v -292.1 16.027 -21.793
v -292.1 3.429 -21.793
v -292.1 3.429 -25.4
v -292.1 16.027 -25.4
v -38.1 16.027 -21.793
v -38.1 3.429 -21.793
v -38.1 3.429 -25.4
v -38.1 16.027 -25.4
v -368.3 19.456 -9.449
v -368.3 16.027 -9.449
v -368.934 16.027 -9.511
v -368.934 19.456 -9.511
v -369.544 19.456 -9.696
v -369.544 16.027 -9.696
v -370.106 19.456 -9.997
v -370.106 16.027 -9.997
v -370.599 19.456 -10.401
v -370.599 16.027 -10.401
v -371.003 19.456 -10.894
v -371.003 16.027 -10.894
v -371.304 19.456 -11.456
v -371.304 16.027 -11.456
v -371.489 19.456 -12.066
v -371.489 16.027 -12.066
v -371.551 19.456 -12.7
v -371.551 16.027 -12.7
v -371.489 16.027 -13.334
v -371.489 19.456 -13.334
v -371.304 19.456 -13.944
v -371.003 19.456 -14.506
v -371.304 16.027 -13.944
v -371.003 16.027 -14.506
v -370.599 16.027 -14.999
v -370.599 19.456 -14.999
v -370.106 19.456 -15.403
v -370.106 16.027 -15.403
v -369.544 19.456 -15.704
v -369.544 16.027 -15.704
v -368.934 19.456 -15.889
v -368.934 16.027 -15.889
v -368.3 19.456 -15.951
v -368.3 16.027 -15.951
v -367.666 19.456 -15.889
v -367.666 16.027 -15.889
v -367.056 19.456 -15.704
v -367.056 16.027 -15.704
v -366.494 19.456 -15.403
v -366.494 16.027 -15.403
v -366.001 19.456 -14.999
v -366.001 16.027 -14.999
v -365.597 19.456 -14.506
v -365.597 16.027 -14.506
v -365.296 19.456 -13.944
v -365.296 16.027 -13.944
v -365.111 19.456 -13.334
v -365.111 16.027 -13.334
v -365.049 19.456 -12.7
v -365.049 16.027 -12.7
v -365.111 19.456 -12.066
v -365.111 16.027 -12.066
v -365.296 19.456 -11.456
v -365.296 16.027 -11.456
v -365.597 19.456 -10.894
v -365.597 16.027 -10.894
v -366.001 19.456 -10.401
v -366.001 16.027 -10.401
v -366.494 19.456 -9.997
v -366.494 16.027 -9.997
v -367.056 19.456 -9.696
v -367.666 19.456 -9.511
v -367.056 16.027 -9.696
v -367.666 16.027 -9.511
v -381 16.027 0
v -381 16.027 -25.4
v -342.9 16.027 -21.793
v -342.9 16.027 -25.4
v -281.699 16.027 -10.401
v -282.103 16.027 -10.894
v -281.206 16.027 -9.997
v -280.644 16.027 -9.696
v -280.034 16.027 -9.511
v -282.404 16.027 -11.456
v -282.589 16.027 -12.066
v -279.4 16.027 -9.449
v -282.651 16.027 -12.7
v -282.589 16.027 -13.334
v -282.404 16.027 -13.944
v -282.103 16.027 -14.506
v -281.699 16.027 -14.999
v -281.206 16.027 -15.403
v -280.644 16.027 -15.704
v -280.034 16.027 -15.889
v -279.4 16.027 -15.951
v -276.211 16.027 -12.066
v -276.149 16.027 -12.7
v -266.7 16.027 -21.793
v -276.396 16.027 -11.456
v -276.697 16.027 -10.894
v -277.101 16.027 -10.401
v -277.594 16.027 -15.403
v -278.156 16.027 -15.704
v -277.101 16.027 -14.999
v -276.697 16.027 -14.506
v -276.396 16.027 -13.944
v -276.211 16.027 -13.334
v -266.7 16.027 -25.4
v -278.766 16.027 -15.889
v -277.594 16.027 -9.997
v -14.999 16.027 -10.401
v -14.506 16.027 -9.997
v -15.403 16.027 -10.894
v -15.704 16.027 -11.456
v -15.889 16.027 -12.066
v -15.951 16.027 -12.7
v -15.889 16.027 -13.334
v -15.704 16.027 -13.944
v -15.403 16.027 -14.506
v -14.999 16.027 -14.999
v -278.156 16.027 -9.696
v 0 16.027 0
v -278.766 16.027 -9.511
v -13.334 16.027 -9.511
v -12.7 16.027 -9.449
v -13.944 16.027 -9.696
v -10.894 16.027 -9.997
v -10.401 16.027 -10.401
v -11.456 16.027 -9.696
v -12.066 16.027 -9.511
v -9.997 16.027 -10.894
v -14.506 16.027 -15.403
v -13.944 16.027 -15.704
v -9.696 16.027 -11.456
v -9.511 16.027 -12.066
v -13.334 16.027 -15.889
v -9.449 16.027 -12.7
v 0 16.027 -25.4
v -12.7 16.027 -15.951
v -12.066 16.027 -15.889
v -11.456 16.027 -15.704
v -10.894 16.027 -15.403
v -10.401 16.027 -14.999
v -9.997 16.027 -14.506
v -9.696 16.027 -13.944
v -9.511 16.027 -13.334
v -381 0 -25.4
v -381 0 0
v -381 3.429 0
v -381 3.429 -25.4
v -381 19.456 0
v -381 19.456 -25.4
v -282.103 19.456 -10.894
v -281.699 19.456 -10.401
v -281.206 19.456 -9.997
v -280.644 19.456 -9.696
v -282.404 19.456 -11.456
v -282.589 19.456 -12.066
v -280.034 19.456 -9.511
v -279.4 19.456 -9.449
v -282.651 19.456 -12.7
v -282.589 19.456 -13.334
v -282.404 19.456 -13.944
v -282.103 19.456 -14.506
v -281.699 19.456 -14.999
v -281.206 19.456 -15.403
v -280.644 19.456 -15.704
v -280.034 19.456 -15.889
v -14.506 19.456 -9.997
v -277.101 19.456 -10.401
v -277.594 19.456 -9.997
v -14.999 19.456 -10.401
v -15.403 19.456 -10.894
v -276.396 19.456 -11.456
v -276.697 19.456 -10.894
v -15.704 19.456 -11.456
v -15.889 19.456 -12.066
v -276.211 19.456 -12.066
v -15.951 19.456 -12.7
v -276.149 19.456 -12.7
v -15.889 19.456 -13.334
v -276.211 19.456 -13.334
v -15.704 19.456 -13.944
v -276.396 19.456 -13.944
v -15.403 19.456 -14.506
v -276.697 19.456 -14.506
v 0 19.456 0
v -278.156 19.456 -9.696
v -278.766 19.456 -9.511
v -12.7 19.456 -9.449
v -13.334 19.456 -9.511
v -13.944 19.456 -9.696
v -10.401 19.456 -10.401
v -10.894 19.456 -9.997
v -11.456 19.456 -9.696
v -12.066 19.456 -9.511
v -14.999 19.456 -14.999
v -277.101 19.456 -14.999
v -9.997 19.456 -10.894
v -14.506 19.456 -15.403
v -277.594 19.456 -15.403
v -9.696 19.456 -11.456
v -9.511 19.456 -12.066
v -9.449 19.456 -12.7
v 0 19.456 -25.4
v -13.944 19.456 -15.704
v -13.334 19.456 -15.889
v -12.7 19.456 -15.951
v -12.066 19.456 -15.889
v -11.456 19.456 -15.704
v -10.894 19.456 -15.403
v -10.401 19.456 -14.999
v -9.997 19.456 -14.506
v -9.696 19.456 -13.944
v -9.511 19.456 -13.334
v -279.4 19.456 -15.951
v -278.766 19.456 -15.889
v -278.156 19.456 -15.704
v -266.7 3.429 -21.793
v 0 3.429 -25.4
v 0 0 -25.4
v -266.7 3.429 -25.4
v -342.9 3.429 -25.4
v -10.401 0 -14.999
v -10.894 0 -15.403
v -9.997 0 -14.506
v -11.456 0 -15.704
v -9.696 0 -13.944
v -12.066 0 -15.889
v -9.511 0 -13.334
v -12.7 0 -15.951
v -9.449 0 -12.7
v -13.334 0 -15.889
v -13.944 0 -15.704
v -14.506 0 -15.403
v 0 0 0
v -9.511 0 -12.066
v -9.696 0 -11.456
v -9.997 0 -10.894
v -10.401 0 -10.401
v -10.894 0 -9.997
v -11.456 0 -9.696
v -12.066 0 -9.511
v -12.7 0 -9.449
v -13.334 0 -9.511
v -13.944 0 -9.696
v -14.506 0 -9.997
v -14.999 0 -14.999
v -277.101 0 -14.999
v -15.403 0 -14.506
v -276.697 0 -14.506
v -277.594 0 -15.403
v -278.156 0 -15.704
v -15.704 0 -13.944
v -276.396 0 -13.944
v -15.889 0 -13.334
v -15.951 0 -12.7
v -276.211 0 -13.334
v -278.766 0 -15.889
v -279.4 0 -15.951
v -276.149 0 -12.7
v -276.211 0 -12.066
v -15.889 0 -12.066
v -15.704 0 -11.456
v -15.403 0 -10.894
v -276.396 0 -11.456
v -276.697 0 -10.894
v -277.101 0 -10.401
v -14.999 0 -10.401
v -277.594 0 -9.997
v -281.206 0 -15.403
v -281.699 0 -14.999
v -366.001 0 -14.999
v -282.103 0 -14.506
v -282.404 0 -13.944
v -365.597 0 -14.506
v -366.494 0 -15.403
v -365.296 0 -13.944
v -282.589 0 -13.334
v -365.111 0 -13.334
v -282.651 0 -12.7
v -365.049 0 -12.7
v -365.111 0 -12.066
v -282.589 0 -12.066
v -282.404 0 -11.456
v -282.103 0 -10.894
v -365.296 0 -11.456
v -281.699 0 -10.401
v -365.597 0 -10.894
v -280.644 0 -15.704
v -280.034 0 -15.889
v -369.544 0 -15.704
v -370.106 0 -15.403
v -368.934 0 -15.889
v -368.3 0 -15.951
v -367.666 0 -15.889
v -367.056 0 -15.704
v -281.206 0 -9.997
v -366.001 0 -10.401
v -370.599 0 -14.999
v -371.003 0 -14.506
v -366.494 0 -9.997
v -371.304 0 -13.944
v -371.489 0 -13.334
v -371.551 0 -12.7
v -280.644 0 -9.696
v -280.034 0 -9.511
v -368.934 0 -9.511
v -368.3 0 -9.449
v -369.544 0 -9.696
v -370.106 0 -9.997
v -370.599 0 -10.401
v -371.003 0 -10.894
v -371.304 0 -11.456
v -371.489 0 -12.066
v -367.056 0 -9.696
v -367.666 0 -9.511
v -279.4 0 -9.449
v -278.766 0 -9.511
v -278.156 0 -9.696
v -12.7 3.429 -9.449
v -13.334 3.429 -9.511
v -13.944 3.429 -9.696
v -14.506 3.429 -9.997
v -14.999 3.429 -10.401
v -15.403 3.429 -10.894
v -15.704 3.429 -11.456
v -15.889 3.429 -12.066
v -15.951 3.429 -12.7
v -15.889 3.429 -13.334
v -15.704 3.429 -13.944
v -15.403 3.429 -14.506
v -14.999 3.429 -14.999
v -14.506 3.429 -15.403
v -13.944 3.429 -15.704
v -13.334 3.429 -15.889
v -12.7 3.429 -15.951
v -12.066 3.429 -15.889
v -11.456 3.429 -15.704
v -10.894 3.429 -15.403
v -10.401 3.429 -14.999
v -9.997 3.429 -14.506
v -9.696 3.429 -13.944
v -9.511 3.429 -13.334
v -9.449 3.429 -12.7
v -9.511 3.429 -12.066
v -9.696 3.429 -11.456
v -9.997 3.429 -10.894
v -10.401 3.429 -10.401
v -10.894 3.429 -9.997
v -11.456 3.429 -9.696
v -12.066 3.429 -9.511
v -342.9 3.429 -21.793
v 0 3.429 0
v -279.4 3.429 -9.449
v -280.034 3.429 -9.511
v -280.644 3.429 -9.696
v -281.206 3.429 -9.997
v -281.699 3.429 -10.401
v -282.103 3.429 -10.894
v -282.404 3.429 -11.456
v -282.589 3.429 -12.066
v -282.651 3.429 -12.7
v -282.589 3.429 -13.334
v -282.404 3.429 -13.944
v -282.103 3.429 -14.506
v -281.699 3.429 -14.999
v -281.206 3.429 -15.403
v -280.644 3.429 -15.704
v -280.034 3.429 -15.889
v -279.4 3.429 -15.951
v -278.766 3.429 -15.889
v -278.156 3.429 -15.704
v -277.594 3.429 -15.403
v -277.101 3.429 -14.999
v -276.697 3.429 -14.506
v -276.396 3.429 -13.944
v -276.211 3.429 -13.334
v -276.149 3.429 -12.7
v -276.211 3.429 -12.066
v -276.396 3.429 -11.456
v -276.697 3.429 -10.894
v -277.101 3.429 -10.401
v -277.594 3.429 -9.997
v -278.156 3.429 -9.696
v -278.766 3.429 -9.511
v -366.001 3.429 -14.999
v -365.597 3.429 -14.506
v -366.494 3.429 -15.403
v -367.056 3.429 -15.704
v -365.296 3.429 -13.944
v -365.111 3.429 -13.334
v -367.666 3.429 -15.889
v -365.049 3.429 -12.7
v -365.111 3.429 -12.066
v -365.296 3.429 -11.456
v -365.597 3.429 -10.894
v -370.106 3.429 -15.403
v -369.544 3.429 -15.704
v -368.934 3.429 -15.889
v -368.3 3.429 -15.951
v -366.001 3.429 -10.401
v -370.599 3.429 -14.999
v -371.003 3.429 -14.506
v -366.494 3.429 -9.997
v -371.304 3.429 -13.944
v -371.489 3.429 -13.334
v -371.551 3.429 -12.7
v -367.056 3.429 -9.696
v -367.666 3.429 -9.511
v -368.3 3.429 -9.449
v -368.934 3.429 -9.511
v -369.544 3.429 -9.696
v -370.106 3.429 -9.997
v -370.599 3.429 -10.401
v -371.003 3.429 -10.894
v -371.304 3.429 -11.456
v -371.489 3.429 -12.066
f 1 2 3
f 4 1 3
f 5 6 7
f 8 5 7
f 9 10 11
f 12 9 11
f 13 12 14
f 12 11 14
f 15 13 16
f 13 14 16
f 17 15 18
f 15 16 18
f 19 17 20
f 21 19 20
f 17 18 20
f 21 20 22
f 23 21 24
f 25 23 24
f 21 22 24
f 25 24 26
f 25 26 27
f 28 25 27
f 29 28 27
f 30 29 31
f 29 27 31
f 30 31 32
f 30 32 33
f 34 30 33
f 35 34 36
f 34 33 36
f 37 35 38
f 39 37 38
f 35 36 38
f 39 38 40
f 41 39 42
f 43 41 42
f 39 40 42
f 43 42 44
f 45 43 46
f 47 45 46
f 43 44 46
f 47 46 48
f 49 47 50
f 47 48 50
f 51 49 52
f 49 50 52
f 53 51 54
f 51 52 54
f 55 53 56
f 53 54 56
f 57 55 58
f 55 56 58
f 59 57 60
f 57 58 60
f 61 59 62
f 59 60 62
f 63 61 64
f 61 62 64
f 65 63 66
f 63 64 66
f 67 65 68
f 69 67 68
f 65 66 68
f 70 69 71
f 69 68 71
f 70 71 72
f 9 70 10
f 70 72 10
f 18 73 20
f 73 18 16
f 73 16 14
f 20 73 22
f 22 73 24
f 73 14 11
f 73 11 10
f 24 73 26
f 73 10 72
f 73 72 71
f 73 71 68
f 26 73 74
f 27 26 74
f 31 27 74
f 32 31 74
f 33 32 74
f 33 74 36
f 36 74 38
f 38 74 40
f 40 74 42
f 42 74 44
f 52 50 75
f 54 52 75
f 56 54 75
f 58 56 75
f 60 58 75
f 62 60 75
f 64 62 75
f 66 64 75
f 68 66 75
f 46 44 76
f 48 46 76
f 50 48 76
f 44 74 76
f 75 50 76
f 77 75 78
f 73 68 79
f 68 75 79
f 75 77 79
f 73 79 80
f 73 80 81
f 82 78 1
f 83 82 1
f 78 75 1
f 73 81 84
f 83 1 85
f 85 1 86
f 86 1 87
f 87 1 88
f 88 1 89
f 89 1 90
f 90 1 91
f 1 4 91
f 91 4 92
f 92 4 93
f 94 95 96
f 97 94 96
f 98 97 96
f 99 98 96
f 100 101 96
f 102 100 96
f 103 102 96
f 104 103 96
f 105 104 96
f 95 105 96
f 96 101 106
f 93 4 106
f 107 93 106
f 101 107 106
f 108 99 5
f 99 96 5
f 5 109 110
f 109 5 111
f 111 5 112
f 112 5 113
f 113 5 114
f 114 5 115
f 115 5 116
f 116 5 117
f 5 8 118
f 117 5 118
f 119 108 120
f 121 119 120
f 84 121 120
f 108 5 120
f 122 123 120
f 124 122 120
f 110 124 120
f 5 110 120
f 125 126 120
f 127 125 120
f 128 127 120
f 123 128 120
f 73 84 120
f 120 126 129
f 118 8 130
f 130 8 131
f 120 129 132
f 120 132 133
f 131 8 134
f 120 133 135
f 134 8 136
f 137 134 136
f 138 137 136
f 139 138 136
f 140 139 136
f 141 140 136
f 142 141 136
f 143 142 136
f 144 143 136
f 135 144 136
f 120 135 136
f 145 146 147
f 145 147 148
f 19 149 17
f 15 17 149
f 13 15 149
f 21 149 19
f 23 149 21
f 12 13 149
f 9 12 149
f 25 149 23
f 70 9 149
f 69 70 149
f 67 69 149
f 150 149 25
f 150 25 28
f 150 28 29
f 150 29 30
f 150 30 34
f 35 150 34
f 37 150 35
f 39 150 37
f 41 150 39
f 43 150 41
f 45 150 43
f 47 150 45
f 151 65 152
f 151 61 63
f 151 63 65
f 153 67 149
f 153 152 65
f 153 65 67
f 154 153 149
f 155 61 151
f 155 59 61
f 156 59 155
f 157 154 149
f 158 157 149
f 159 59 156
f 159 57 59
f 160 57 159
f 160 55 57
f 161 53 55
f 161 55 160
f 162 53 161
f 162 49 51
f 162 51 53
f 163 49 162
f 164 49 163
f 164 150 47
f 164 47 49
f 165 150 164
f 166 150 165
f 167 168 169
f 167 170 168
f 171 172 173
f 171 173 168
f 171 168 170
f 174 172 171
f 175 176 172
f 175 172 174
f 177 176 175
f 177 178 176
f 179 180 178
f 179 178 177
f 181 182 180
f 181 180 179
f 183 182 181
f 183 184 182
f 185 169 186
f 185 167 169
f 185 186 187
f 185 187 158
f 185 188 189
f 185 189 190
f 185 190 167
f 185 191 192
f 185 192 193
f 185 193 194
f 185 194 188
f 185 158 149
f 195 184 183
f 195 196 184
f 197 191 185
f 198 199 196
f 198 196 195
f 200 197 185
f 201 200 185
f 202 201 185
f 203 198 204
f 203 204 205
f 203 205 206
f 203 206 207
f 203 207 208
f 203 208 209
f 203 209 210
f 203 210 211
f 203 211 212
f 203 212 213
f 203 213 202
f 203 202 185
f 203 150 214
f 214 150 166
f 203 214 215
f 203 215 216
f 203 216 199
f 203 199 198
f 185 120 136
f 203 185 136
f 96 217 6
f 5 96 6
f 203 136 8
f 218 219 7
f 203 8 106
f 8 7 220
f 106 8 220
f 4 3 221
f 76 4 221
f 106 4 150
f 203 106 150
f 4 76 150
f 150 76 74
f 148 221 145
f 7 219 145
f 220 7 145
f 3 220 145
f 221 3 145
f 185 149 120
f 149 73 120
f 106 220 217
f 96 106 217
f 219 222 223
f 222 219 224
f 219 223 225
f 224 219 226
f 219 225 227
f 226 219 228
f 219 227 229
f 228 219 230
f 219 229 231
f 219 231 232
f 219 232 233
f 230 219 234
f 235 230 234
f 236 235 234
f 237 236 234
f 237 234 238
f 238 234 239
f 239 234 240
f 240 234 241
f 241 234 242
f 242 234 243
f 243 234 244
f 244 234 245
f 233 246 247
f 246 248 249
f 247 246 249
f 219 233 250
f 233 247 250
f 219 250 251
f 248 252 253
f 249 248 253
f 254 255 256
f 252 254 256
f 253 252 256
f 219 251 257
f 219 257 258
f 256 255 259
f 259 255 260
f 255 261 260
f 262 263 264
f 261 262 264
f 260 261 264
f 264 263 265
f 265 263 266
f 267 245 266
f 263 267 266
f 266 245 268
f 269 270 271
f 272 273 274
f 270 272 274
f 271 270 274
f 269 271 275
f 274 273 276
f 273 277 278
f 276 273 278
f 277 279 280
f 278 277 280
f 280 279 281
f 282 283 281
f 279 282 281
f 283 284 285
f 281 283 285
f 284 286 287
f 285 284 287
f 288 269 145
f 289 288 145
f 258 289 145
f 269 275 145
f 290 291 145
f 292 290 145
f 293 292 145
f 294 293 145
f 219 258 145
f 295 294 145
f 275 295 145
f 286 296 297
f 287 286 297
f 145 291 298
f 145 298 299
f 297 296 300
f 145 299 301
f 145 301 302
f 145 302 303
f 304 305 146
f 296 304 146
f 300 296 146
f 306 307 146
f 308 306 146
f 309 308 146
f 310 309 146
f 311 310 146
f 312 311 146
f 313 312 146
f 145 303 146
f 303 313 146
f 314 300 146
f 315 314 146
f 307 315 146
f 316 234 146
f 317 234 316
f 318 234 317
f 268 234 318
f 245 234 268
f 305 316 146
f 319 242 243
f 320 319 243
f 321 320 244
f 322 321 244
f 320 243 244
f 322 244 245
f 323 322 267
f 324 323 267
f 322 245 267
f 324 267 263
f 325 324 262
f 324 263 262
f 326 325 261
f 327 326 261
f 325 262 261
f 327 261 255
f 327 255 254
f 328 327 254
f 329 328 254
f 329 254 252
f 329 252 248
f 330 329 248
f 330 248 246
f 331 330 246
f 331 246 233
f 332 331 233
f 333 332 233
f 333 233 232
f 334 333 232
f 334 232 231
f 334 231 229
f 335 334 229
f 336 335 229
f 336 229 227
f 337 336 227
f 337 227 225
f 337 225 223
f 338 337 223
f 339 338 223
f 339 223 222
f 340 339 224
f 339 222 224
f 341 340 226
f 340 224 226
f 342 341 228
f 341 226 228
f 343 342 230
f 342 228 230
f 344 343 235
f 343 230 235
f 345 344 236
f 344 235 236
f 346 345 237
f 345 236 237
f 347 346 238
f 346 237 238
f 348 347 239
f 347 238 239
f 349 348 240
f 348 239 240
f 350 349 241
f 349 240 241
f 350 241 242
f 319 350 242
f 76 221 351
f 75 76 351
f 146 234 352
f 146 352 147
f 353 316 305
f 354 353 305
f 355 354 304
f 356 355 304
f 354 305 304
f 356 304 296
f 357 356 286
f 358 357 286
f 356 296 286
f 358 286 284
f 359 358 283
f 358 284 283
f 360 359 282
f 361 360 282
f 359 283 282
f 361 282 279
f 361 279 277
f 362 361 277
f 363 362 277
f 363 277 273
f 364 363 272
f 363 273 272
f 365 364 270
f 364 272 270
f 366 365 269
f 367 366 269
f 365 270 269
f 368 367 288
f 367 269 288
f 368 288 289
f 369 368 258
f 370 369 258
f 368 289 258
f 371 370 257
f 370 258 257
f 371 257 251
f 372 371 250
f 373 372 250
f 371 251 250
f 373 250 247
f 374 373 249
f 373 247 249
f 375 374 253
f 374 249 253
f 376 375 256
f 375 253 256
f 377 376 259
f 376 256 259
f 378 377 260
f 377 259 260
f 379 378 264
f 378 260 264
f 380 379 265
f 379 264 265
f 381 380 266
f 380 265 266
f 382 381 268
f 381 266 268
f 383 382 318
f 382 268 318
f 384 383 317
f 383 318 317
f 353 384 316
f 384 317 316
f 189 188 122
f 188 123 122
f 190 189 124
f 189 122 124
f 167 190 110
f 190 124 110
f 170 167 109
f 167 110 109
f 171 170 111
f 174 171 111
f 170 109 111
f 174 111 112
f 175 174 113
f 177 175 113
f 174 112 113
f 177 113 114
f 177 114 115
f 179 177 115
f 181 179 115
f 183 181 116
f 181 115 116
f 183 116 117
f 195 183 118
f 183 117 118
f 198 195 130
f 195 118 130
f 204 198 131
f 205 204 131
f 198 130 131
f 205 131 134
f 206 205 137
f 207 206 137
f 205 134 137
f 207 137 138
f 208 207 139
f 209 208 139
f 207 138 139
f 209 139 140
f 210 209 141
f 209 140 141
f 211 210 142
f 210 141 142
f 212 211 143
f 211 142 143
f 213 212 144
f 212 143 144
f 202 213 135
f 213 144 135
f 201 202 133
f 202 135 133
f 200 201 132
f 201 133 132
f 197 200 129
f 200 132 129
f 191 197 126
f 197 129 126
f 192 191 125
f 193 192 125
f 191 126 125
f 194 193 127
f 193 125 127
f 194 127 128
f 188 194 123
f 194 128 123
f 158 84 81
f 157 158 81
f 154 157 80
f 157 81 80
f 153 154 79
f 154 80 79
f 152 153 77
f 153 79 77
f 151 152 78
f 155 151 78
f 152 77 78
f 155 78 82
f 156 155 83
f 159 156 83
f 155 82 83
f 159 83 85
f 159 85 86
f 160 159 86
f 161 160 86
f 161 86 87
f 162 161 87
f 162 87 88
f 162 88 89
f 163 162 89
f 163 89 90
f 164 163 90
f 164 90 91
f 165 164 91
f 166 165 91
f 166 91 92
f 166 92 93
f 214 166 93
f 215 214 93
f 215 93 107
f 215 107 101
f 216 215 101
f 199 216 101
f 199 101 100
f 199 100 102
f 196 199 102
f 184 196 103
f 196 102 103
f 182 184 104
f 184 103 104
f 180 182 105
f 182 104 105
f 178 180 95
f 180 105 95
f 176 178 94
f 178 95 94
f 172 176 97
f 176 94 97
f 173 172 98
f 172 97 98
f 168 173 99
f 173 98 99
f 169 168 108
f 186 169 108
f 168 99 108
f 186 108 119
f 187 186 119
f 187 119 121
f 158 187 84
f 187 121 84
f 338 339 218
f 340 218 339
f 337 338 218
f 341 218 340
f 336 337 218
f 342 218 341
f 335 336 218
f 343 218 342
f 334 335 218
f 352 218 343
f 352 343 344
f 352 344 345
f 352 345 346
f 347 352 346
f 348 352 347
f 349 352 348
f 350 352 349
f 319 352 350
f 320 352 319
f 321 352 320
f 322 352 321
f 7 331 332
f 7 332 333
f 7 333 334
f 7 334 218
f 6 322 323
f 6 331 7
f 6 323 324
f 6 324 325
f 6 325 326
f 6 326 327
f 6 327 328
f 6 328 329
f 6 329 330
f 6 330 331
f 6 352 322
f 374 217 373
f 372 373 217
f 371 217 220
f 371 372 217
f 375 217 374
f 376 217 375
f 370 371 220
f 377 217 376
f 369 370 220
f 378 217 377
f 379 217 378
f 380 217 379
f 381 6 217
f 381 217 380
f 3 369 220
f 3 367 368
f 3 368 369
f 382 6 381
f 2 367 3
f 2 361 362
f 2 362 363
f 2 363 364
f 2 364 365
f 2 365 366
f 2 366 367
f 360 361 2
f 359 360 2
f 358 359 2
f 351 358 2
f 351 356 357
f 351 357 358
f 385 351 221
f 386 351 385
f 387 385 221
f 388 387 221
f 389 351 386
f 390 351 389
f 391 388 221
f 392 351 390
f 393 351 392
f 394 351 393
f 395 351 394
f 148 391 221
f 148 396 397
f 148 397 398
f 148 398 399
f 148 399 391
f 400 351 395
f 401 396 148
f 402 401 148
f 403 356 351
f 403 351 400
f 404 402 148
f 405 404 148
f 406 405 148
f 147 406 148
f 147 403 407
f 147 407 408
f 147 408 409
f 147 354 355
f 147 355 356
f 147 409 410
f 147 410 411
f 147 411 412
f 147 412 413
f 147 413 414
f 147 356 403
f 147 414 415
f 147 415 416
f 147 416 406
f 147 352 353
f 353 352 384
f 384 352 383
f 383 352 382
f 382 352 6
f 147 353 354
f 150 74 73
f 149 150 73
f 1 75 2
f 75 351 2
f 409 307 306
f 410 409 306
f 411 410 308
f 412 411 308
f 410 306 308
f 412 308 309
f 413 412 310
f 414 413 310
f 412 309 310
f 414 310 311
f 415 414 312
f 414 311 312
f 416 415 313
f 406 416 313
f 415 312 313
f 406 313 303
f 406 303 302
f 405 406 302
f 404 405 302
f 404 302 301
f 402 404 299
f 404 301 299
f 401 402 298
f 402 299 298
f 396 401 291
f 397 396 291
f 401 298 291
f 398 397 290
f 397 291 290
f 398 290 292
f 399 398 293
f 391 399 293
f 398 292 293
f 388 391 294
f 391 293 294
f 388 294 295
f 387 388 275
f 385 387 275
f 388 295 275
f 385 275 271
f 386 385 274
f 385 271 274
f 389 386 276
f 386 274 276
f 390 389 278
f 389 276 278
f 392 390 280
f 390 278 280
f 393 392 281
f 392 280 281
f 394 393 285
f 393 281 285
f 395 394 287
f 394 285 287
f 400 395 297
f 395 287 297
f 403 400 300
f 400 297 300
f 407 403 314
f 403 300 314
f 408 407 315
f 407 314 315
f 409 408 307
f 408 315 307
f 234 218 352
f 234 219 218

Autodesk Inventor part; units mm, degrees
ref_plane "YZ Plane" through (0, 0, 0) normal (1, 0, 0) x (0, 1, 0)
ref_plane "XZ Plane" through (0, 0, 0) normal (0, 1, 0) x (-1, 0, 0)
ref_plane "XY Plane" through (0, 0, 0) normal (0, 0, 1) x (1, 0, 0)
sketch "Sketch1" plane through (0, 0, 0) normal (0, 1, 0) x (-1, 0, 0)
  line L0 (0, 0) -> (381, 0)
  line L1 (381, 0) -> (381, -25.4)
  line L2 (381, -25.4) -> (0, -25.4)
  line L3 (0, -25.4) -> (0, 0)
  dimension "d0" = 381
  dimension "d1" = 25.4
extrude "Extrusion1" add sketch "Sketch1" along normal blind 3.429
sketch "Sketch2" plane through (0, 3.429, 0) normal (0, 1, 0) x (1, 0, 0)
  line L0 (0, 25.4) -> (-381, 25.4) projected
  line L1 (-38.1, 25.4) -> (-266.7, 25.4)
  line L2 (-266.7, 25.4) -> (-266.7, 21.7932)
  line L3 (-266.7, 21.7932) -> (-38.1, 21.7932)
  line L4 (-38.1, 21.7932) -> (-38.1, 25.4)
  line L5 (0, 0) -> (0, 25.4) projected
  line L6 (-292.1, 25.4) -> (-342.9, 25.4)
  line L7 (-342.9, 25.4) -> (-342.9, 21.7932)
  line L8 (-342.9, 21.7932) -> (-292.1, 21.7932)
  line L9 (-292.1, 21.7932) -> (-292.1, 25.4)
  point P0 (-266.7, 23.5966)
  dimension "d4" = 228.6
  dimension "d5" = 3.6068
  dimension "d6" = 38.1
  dimension "d7" = 50.8
  dimension "d8" = 3.6068
  dimension "d9" = 25.4
extrude "Extrusion2" add sketch "Sketch2" along normal blind 12.5984
sketch "Sketch3" plane through (0, 16.0274, 0) normal (0, 1, 0) x (1, 0, 0)
  line L0 (-381, 0) -> (0, 0) projected
  line L1 (0, 25.4) -> (-381, 25.4) projected
  line L2 (-381, 0) -> (0, 0)
  line L3 (0, 0) -> (0, 25.4)
  line L4 (0, 25.4) -> (-381, 25.4)
  line L5 (-381, 25.4) -> (-381, 0)
extrude "Extrusion3" add sketch "Sketch3" along normal blind 3.429
sketch "Sketch4" plane through (0, 19.4564, 0) normal (0, 1, 0) x (1, 0, 0)
  line L0 (0, 25.4) -> (-381, 25.4) projected
  line L1 (0, 0) -> (0, 25.4) projected
  point P0 (-12.7, 12.7)
  dimension "d14" = 12.7
  dimension "d15" = 12.7
hole "Hole1" at (-12.7, 19.4564, -12.7) direction (0, -1, 0) diameter 6.5024 end through all
sketch "Sketch5" plane through (0, 19.4564, 0) normal (0, 1, 0) x (1, 0, 0)
  line L0 (0, 25.4) -> (-381, 25.4) projected
  line L1 (-381, 25.4) -> (-381, 0) projected
  point P0 (0, 0)
  point P1 (-279.4, 12.7)
  point P2 (-381, 12.7)
  dimension "d23" = 12.7
  dimension "d40" = 101.6
hole "Hole2" at (-279.4, 19.4564, -12.7) direction (0, -1, 0) diameter 6.5024 end through all
sketch "Sketch6" plane through (0, 19.4564, 0) normal (0, 1, 0) x (1, 0, 0)
  line L0 (0, 25.4) -> (-381, 25.4) projected
  line L1 (-381, 25.4) -> (-381, 0) projected
  point P0 (0, 0)
  point P1 (-368.3, 12.7)
  dimension "d31" = 12.7
  dimension "d32" = 12.7
hole "Hole3" at (-368.3, 19.4564, -12.7) direction (0, -1, 0) diameter 6.5024 end through all
properties part number "ArmPart3"
